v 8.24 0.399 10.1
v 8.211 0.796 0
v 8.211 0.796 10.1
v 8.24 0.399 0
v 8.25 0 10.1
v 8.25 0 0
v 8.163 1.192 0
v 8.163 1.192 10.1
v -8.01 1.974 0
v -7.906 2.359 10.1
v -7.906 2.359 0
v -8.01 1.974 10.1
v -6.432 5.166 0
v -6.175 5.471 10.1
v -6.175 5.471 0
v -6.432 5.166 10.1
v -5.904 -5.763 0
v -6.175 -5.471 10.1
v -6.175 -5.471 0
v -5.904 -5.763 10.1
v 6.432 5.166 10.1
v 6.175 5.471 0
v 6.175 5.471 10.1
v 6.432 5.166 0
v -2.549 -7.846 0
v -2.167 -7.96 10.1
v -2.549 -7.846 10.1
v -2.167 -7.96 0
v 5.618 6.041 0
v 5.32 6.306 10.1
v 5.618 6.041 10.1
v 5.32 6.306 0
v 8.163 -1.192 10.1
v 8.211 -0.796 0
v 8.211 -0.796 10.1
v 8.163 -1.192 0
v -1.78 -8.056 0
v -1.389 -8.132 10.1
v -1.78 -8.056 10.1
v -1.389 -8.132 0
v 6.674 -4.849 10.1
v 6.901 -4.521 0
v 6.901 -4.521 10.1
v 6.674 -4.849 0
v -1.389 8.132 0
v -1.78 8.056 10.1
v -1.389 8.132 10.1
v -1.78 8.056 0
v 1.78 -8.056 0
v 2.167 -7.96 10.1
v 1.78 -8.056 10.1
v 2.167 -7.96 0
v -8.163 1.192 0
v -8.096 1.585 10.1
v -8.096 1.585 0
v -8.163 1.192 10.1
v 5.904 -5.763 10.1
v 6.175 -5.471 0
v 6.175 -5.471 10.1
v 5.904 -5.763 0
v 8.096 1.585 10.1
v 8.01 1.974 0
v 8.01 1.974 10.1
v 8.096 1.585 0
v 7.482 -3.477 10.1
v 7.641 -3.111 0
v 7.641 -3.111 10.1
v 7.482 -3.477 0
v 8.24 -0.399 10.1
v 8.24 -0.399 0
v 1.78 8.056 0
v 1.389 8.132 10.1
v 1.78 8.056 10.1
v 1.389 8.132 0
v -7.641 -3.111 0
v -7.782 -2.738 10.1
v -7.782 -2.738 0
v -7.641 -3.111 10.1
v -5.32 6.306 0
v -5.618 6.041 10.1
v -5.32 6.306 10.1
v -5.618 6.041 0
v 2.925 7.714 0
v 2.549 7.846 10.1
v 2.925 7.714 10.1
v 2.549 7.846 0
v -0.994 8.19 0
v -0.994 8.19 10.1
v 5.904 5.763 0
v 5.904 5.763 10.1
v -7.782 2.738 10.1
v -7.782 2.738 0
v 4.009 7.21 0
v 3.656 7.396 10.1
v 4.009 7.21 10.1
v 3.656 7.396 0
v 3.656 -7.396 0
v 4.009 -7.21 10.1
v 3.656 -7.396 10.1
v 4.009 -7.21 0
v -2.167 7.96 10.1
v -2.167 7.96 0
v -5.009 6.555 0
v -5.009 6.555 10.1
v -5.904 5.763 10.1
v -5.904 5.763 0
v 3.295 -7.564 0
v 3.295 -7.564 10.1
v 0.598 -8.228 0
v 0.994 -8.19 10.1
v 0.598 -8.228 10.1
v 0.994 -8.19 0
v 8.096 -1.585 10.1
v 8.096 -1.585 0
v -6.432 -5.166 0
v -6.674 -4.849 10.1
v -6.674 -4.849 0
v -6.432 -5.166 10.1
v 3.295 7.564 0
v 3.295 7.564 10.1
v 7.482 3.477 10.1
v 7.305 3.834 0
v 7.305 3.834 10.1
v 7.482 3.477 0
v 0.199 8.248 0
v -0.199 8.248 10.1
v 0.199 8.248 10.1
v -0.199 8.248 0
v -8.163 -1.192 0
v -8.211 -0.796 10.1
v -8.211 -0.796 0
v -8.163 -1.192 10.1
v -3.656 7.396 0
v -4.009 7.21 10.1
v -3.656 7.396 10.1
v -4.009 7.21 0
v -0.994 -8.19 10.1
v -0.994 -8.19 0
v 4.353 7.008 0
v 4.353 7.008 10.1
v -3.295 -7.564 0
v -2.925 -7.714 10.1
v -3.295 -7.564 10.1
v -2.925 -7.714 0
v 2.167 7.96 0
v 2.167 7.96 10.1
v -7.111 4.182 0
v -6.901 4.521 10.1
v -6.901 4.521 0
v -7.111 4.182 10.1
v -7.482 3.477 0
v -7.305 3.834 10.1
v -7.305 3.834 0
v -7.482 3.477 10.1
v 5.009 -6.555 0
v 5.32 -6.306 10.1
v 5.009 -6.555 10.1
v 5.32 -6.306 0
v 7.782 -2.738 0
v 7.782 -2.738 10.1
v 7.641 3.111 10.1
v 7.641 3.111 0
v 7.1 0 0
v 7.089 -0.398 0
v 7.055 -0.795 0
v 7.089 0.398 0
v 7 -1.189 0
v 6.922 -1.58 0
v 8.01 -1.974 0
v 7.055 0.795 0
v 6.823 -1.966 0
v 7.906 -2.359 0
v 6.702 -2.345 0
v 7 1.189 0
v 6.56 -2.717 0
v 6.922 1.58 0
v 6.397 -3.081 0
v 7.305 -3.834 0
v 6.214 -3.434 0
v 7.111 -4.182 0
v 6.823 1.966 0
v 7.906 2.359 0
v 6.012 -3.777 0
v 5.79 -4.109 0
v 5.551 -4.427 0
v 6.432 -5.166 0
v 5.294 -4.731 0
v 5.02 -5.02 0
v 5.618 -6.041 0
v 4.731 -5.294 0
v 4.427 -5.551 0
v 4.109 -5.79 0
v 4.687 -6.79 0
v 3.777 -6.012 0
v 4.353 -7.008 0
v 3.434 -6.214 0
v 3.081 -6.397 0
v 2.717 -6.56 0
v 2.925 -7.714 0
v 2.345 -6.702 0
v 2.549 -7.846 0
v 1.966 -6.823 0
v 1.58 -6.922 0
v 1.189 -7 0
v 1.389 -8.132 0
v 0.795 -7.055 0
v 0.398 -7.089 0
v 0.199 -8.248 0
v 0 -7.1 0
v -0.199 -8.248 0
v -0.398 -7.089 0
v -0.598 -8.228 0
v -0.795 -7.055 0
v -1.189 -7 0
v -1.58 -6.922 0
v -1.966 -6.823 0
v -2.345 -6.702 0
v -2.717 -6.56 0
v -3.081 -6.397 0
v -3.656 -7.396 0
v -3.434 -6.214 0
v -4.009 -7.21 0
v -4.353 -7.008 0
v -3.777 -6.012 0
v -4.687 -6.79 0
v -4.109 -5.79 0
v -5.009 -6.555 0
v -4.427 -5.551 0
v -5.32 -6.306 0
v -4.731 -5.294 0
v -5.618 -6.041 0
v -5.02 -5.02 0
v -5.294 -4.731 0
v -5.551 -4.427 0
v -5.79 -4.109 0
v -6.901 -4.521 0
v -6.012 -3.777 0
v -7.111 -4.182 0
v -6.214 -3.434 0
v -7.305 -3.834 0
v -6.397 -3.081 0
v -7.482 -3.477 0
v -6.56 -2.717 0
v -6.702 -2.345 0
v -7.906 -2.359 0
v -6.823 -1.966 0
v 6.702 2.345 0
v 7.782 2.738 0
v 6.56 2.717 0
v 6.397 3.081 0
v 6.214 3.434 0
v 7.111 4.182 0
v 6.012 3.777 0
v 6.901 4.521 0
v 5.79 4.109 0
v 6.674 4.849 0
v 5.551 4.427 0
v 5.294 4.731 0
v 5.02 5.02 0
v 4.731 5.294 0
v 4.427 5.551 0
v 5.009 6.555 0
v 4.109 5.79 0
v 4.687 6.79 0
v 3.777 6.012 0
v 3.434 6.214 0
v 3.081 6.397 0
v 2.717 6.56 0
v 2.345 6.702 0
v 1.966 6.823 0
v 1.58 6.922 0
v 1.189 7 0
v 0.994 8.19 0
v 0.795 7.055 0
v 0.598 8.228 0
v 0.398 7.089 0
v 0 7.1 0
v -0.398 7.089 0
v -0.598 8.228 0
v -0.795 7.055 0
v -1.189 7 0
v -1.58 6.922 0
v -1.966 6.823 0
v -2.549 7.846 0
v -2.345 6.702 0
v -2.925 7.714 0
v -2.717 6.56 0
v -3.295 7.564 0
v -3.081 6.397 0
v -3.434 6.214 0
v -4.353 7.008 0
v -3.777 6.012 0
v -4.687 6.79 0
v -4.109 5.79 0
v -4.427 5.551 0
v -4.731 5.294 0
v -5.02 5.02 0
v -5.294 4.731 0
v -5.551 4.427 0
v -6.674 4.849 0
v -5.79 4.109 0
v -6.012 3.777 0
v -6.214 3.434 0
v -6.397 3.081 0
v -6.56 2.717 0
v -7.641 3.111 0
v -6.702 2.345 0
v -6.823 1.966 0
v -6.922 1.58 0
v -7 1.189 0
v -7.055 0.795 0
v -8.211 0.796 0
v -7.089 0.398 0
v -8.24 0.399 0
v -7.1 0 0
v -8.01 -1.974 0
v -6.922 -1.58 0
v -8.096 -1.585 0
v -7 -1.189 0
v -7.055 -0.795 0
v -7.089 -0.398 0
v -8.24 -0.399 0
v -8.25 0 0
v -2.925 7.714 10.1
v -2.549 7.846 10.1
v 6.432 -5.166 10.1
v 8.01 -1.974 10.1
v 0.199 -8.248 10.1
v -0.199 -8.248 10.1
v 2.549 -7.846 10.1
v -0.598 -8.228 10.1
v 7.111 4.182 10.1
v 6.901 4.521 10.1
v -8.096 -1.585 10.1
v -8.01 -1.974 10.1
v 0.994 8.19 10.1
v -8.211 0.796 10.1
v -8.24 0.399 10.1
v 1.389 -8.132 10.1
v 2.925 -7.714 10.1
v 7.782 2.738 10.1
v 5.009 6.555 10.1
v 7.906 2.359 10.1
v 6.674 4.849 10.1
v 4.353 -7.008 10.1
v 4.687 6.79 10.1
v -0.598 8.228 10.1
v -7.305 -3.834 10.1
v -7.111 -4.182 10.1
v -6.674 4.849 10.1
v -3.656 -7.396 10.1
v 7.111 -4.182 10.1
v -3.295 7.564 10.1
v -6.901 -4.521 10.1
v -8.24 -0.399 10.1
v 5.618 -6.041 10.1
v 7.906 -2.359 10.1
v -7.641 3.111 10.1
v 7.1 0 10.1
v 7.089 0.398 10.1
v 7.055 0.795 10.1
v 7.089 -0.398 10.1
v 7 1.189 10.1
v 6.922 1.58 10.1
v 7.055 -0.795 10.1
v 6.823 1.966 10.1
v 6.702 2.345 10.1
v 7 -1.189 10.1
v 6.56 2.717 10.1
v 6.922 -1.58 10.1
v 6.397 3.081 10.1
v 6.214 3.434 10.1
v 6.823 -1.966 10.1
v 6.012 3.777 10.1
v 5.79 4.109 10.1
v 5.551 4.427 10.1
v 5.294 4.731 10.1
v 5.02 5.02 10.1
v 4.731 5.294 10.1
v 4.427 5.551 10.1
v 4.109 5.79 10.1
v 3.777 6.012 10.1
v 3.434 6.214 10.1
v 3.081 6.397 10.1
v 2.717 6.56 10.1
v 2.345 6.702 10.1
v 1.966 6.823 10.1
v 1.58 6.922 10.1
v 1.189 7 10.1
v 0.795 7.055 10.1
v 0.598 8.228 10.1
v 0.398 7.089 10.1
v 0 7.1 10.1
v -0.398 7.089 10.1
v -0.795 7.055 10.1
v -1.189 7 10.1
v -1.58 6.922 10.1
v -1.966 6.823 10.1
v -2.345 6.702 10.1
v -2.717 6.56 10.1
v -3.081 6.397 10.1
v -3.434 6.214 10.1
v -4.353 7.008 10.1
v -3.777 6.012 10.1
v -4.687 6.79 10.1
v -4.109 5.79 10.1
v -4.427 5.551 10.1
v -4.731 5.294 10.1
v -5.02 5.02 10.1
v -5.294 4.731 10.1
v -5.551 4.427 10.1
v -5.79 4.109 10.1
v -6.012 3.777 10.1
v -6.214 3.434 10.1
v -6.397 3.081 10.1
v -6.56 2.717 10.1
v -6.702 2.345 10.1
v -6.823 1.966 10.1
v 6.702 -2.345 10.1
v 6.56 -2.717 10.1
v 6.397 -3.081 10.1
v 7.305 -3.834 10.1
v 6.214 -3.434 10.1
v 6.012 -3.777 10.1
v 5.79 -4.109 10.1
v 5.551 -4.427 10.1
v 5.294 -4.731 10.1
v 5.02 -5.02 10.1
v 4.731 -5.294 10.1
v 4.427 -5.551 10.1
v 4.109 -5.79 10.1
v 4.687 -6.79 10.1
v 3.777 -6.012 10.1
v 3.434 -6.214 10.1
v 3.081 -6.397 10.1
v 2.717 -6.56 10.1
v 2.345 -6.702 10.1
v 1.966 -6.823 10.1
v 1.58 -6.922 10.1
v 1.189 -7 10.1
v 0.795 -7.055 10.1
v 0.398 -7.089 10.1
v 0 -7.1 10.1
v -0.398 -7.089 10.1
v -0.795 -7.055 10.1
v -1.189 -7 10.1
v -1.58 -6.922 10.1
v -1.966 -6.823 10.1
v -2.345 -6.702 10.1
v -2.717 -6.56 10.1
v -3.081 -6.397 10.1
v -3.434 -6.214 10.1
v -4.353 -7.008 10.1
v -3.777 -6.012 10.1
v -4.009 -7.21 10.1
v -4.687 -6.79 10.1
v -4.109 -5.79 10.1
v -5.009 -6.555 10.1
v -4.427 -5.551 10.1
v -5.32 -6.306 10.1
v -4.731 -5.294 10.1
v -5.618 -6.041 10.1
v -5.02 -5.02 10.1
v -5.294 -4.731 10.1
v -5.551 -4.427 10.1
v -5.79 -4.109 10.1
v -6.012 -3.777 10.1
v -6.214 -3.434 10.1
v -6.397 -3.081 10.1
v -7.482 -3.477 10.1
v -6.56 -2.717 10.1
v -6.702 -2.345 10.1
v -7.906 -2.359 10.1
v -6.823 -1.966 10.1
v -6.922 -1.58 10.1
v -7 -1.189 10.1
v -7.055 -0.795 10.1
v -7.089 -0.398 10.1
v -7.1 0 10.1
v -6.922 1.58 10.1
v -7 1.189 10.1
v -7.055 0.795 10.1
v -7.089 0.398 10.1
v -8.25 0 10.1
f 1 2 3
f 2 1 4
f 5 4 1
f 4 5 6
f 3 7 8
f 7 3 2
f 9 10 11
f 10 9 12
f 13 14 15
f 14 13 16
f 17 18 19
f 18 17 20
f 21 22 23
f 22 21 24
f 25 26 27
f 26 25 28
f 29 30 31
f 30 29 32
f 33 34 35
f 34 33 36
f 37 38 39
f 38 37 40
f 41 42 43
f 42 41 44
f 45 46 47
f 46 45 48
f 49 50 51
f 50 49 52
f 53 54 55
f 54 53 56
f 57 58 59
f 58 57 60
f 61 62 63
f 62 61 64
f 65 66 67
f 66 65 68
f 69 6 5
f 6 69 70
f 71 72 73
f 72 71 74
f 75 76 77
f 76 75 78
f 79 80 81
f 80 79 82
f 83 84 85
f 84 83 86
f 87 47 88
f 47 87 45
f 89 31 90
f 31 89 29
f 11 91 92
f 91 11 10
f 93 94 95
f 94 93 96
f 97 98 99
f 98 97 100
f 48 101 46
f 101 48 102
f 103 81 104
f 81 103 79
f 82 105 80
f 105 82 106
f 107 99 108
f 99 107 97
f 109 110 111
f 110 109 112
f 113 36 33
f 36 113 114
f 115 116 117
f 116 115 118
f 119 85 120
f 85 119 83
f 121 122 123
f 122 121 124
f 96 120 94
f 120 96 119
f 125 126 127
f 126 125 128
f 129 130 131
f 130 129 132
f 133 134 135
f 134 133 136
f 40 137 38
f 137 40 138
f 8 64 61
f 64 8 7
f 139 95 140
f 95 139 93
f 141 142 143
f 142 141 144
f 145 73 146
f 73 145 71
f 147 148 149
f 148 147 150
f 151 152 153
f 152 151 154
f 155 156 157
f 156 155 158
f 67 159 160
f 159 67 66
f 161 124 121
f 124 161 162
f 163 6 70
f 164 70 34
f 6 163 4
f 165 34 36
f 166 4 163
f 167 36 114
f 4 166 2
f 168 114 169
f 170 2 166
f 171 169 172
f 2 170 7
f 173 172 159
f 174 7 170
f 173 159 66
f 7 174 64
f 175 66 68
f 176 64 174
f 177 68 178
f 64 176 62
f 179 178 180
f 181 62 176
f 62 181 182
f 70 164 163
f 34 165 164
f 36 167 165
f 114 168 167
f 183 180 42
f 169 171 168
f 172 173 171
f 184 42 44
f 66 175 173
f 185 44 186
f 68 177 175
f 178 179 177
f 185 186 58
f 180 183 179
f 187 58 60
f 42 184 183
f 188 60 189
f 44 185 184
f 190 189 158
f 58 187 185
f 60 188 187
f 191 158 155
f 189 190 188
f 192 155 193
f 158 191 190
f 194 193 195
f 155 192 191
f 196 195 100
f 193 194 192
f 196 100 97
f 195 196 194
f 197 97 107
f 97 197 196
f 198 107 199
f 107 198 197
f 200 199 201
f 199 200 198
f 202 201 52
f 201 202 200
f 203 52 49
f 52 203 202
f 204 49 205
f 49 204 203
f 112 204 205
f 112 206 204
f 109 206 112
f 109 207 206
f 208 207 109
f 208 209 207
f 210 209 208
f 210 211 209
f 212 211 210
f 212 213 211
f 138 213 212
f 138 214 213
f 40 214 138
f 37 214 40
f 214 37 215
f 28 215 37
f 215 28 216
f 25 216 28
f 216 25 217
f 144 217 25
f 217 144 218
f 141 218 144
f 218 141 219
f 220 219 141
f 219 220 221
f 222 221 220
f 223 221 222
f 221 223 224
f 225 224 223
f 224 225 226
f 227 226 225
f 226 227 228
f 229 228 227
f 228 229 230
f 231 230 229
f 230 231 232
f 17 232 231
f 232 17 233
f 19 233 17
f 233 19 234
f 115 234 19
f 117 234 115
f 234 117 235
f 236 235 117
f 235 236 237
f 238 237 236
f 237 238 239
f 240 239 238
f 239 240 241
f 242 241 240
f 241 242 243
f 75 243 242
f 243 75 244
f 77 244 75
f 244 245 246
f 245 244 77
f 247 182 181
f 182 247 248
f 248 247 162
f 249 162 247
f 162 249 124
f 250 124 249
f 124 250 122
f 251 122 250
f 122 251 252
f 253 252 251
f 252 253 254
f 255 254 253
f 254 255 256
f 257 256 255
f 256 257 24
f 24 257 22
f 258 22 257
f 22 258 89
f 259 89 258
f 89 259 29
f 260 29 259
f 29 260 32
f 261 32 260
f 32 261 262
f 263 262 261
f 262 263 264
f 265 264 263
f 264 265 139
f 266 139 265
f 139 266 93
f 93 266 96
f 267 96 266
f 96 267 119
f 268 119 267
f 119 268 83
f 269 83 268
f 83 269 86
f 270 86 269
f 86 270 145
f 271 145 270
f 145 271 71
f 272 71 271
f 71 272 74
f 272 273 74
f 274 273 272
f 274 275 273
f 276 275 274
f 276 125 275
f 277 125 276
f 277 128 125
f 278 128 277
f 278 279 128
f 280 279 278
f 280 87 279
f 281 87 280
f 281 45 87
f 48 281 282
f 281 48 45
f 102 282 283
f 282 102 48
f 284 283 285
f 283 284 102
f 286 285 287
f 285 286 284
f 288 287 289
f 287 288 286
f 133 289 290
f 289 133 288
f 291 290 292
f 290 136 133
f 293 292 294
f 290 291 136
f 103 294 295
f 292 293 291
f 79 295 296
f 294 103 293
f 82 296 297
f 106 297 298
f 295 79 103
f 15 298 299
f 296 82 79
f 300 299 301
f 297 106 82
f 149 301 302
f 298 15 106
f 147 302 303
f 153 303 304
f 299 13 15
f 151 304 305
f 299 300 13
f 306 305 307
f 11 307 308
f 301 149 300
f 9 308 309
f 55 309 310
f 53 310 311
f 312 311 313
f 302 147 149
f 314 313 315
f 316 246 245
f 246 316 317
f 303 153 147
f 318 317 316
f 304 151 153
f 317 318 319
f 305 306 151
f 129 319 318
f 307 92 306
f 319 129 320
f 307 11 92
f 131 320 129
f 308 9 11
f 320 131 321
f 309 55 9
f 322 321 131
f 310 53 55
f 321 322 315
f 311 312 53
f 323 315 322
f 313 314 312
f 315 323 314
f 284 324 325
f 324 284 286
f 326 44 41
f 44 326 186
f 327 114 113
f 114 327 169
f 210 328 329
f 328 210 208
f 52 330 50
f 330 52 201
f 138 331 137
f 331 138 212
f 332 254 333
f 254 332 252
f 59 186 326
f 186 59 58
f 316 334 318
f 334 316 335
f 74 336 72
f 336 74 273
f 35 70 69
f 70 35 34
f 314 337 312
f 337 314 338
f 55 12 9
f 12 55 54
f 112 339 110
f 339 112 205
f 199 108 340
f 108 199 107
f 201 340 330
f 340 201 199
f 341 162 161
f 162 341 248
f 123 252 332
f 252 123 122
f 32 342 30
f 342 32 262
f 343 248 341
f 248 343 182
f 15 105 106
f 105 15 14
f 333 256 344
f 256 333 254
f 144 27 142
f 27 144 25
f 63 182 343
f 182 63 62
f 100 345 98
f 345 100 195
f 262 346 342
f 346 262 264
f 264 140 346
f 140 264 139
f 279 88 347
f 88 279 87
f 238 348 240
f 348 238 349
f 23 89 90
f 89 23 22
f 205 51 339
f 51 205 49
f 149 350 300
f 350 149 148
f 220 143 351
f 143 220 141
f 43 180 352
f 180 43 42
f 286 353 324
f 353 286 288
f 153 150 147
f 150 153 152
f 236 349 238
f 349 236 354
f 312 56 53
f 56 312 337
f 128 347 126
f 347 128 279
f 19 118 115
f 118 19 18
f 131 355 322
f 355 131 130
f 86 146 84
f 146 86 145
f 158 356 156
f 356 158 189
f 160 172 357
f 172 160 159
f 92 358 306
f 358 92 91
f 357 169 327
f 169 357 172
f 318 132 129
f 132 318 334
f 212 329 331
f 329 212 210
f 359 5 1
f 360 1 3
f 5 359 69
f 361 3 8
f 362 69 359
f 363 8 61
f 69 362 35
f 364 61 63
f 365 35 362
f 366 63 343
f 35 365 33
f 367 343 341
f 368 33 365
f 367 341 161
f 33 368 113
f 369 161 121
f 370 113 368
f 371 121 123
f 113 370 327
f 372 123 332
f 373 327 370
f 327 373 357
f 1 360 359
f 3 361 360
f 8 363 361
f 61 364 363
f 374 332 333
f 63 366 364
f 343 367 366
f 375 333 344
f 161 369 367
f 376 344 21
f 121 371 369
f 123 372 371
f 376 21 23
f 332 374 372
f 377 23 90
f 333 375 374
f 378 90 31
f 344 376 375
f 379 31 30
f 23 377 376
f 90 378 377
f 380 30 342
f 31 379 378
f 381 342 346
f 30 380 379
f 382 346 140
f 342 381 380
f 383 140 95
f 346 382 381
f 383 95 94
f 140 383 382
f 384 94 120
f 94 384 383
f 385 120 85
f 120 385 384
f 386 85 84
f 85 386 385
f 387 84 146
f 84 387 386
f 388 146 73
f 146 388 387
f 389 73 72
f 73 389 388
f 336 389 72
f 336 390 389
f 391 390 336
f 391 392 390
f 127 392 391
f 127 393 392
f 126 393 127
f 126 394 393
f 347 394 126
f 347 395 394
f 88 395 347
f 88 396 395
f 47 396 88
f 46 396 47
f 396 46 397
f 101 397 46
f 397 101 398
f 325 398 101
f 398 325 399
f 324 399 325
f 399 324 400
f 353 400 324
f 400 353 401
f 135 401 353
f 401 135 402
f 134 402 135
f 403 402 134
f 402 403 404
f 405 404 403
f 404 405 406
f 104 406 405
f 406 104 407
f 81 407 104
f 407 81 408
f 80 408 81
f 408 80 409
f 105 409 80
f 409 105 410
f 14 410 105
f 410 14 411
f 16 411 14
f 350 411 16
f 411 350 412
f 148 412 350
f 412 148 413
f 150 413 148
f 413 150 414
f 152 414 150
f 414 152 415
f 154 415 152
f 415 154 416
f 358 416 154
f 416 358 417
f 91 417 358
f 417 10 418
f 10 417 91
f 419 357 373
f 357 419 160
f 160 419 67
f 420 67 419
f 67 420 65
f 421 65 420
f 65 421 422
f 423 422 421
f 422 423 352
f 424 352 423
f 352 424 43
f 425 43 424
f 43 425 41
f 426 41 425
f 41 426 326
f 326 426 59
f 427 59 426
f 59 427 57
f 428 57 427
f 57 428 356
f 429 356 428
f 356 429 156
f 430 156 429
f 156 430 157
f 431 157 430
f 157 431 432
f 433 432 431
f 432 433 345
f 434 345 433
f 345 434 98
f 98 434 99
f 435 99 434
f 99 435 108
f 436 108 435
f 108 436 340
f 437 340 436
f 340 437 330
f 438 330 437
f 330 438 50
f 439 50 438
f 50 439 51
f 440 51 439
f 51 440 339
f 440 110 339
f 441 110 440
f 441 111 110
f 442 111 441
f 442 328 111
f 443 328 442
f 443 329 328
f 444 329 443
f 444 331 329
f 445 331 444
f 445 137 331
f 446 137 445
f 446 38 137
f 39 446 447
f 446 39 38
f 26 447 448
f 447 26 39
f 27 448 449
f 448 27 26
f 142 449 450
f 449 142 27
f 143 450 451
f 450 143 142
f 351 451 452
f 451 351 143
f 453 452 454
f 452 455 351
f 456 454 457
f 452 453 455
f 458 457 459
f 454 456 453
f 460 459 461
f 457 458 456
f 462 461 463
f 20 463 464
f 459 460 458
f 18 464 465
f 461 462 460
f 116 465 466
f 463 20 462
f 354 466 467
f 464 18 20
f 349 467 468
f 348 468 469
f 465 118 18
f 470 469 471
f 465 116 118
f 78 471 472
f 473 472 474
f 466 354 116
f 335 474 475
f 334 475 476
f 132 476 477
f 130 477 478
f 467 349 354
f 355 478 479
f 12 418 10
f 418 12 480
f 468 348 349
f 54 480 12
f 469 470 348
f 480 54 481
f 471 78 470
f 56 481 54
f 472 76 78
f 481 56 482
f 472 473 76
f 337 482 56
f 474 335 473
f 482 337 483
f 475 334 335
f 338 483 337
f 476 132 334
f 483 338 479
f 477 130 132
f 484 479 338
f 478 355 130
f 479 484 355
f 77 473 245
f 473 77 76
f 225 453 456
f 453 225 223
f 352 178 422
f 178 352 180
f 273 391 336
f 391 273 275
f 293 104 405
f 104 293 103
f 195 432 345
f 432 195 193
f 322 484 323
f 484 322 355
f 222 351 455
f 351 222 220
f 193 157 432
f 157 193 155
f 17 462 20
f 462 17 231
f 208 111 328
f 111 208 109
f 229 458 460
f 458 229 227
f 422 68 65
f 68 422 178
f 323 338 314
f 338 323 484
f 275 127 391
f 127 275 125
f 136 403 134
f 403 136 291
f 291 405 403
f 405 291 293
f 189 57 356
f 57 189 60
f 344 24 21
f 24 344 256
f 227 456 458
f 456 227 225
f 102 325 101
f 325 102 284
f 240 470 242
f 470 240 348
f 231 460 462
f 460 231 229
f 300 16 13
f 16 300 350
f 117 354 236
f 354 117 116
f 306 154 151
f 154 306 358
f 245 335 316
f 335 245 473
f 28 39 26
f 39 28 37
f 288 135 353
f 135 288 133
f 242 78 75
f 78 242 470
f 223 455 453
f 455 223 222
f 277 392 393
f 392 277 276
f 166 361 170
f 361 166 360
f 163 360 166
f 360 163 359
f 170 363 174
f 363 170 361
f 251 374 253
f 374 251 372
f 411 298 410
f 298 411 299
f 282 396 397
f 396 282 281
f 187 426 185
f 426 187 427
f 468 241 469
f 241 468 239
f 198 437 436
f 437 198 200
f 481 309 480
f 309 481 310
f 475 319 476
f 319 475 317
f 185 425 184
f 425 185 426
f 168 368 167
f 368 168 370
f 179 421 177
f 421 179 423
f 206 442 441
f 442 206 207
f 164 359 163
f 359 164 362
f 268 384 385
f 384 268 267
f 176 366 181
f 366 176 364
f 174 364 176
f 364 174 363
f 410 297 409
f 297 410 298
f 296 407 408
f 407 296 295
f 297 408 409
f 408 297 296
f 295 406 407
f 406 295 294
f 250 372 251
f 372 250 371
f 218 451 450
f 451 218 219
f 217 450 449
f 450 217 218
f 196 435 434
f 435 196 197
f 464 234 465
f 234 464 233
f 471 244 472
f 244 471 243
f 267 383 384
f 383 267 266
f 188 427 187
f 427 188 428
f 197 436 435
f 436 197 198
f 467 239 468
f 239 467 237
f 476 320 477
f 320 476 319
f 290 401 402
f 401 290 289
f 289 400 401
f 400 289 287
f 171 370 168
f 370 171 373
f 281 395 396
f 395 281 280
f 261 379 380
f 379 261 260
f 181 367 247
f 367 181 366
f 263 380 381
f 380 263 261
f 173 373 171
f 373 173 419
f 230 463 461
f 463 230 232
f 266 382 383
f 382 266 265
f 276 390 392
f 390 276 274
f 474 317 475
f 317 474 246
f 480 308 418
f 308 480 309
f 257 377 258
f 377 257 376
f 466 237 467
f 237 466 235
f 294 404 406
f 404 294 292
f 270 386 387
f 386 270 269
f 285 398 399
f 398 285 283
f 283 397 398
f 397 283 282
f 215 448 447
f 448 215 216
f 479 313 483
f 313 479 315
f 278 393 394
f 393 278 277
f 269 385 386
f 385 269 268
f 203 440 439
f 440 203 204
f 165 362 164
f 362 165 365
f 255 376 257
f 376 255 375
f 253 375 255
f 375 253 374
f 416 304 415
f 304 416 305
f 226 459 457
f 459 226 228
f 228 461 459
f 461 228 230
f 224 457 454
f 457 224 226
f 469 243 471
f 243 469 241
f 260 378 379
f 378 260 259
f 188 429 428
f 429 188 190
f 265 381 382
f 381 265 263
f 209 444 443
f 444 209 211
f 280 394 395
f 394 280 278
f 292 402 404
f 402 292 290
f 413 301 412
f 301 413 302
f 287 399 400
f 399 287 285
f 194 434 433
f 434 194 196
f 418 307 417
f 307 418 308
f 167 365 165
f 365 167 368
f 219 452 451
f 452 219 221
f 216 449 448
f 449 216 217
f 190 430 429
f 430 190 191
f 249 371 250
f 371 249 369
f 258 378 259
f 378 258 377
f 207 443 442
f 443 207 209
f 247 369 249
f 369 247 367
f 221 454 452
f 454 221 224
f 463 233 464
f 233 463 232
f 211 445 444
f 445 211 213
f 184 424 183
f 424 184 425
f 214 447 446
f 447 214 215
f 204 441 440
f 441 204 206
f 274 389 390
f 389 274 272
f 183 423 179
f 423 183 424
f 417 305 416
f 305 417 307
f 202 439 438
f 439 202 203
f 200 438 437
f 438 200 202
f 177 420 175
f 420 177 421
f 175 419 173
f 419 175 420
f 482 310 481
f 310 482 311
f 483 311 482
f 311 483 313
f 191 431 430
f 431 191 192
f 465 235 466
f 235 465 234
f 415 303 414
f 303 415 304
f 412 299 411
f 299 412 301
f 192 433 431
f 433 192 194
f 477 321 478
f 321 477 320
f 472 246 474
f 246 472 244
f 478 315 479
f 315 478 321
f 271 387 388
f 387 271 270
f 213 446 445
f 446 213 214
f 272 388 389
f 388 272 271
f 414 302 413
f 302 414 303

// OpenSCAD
/*
Fitting for Ikea Abacken filter for special size tap
Z = 11.6 - 1.5 (filter upper part) = 10.1
outsideD = 16.3
innerD = 14
*/

// The resolution variables:
$fa = 1;
$fs = 0.4;

// Main dimension vareables

z = 10.1;
outsideD = 16.5; // Added 0.2 to outsideD and insideD for better fitting (didn't fit before)
insideD = 14.2;

// Calculated vareables

outsideR = outsideD / 2;
insideR = insideD / 2;

// Main

difference(){
    cylinder (r = outsideR, h = z);
    translate([0, 0, -10])
        cylinder (r = insideR,  h = z * 2);
}
